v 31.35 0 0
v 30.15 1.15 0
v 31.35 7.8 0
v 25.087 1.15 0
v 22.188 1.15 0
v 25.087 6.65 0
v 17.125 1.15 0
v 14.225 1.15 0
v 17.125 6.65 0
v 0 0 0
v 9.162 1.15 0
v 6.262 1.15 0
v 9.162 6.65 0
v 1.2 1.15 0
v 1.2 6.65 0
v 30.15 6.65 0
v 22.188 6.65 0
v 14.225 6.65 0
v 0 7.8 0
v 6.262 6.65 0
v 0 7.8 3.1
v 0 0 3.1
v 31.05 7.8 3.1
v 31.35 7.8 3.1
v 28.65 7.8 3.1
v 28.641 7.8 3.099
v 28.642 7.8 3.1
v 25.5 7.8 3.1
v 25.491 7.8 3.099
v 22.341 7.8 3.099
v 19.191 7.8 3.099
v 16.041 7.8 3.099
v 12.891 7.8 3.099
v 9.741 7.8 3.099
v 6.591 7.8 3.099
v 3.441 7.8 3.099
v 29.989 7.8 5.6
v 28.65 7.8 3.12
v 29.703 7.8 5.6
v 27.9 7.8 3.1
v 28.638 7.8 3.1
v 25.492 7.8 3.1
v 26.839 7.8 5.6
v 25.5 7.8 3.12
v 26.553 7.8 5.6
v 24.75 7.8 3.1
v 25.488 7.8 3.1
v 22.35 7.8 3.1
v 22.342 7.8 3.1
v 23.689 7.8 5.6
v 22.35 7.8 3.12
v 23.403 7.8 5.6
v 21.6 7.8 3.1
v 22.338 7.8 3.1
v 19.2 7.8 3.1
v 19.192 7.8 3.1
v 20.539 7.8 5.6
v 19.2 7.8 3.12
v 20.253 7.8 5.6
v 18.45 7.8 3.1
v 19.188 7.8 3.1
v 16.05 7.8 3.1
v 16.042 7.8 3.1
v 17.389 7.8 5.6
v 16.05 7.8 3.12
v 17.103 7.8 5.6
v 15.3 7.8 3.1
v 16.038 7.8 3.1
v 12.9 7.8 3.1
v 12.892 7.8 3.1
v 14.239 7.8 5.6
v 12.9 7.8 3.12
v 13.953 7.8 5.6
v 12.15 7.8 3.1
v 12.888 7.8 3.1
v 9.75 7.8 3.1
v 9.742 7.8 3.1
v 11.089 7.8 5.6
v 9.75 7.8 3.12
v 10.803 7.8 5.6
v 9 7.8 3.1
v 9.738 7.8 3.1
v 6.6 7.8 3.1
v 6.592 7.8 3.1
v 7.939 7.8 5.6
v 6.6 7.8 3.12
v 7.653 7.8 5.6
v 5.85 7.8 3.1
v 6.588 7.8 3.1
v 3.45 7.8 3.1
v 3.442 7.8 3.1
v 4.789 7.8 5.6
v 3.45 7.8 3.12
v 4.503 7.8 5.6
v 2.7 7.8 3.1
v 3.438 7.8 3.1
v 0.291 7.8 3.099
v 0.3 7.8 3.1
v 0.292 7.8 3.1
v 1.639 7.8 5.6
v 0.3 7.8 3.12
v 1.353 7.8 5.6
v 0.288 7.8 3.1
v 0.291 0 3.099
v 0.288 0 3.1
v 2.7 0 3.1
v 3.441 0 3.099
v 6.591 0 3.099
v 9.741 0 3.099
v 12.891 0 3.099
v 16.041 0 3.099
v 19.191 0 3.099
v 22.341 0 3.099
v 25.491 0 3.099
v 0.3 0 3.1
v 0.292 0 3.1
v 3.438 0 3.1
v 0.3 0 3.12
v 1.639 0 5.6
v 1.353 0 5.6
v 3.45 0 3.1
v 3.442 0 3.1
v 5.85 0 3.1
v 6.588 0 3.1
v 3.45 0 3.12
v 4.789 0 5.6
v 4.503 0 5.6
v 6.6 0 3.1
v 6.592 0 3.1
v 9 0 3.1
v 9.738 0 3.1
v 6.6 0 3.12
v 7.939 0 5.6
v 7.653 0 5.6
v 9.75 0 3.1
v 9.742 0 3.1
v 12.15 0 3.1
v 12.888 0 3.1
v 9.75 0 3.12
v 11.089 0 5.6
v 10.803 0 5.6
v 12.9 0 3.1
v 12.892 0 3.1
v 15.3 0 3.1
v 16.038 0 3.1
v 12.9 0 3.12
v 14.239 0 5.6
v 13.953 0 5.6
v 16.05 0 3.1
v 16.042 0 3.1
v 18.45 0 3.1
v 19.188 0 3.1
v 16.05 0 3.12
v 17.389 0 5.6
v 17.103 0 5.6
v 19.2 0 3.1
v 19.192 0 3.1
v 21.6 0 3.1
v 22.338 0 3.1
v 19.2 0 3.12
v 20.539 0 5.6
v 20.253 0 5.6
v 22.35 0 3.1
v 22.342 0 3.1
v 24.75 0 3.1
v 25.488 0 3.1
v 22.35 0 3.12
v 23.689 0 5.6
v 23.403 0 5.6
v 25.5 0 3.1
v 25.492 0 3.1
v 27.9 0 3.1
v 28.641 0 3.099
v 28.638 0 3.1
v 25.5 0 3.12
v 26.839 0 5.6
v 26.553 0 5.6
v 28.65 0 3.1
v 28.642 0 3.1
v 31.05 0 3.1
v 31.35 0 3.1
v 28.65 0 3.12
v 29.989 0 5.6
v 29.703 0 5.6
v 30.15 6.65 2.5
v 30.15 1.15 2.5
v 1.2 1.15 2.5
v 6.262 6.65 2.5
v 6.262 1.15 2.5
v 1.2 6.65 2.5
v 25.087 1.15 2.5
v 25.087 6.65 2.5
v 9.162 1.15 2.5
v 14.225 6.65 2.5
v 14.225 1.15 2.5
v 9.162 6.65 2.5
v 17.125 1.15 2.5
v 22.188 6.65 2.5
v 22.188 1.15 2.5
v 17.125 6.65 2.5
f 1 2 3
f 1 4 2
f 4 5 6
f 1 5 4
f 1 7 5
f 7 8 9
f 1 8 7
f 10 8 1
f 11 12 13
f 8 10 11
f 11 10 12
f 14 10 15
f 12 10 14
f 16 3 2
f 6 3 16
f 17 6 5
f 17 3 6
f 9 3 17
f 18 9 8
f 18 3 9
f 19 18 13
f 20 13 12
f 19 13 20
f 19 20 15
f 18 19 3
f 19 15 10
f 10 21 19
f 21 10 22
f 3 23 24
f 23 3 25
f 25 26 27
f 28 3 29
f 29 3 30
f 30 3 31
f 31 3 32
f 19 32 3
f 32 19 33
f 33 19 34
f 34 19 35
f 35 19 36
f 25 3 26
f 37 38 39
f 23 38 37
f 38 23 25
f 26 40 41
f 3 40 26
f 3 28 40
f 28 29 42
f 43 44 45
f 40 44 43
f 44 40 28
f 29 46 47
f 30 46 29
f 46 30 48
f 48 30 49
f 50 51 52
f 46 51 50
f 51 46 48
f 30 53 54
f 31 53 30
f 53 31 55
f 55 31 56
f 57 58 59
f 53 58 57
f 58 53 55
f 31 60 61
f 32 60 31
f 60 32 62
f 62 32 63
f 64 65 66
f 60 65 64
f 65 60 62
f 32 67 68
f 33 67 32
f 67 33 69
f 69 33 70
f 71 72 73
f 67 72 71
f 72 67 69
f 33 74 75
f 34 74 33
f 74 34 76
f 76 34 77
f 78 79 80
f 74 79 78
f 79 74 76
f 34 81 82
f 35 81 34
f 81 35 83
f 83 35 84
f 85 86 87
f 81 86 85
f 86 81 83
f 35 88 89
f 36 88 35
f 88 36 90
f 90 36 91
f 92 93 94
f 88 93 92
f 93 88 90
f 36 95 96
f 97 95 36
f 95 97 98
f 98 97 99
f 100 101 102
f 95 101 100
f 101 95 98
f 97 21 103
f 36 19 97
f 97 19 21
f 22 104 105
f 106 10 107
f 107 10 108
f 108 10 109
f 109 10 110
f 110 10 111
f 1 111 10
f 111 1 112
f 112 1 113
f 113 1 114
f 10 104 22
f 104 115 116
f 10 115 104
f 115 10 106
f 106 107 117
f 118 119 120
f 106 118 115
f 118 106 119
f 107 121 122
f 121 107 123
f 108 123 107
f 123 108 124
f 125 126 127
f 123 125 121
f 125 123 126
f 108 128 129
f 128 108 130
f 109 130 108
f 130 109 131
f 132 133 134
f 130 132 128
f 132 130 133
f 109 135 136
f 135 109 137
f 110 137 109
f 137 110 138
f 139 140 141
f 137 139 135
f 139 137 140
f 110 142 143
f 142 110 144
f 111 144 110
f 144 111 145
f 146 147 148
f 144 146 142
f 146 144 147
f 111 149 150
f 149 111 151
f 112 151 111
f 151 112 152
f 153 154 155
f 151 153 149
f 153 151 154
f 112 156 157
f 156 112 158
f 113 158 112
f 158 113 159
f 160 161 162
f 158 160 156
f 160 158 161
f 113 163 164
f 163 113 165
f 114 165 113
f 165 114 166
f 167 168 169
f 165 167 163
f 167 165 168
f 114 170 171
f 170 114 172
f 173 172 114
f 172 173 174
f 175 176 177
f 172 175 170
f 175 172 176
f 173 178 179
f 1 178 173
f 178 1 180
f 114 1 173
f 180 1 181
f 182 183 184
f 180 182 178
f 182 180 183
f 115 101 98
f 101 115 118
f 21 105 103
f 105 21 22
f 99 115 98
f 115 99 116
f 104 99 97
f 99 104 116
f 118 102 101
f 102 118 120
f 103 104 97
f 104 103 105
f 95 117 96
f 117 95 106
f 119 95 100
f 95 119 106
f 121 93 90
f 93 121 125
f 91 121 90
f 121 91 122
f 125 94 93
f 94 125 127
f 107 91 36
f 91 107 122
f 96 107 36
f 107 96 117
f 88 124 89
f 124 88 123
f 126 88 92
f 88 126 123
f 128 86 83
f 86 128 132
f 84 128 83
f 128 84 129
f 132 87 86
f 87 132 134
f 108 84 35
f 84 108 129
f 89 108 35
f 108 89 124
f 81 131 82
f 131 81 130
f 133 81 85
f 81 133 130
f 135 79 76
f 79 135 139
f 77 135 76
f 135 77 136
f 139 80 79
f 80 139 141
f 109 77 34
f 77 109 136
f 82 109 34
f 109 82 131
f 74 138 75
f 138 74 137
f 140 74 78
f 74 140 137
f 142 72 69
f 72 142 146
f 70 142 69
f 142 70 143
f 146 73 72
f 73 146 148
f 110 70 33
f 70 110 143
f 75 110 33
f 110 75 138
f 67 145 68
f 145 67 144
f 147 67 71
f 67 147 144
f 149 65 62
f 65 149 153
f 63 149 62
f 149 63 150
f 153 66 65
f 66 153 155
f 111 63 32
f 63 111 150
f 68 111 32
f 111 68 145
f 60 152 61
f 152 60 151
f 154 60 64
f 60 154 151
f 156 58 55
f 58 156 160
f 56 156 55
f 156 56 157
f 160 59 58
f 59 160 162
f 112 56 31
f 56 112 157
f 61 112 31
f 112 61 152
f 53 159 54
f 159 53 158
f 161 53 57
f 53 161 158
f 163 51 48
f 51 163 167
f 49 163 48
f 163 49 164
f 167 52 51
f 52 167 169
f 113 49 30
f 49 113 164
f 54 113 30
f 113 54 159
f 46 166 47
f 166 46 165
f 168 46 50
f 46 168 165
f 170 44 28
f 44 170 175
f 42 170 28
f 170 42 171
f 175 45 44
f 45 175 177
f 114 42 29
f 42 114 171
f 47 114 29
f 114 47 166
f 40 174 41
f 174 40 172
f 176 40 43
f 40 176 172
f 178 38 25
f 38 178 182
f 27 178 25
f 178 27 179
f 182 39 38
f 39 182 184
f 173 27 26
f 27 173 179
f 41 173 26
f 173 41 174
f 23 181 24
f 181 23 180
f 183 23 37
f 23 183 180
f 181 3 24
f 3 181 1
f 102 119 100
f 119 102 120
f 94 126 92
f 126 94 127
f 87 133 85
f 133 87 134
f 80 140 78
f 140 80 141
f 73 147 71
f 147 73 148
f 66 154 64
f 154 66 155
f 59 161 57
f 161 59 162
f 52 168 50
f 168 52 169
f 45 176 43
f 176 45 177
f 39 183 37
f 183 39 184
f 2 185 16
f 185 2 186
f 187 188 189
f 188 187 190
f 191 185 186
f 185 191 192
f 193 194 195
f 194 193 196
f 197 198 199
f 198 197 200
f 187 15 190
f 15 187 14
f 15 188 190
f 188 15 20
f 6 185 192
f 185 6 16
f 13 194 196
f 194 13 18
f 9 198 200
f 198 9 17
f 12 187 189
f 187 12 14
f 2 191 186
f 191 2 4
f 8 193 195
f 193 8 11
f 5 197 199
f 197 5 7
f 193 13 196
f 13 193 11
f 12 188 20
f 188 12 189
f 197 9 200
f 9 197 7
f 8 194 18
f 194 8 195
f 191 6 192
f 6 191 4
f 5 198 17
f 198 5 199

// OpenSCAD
length = 31.35;
width= 7.8;
height= 5.8;

toothwidth = 3.15;

brick_width = 5.0625;
end_thickness = 1.2;
middle_thickness = 2.9;

module tooth()
{
	difference()
	{

		cube([3.21,width,height]);

		//1. Zahn
		translate([0,-0.1,4-0.9]) cube([0.3,width+0.2,1.8]);
		translate([-1.55,-0.1,3.88]) rotate([0,23,0]) cube([2,width+0.2,3]);

		//2. Zahn
		translate([2.2+0.5,-0.1,4-0.9]) cube([1/2+0.1,width+0.2,3]);
		translate([2.7,-0.1,3.1]) rotate([0,-23,0]) cube([1,width+0.2,3]);
		translate([2.2,-0.1,5.1]) cube([0.8,width+0.2,1.8]);
	}

}

		

module toothbrick4()
{

	difference()
	{

		union()
		{
			tooth();   				//1
			translate([toothwidth,0,0]) tooth();
			translate([2*toothwidth,0,0]) tooth();
			translate([3*toothwidth,0,0]) tooth();
			translate([4*toothwidth,0,0]) tooth();	//5
			translate([5*toothwidth,0,0]) tooth();
			translate([6*toothwidth,0,0]) tooth();
			translate([7*toothwidth,0,0]) tooth();
			translate([8*toothwidth,0,0]) tooth();	
			translate([9*toothwidth,0,0]) tooth();	//10
			
		}
	
	//cut end
	translate([length,0,0]) cube([10,10,10]);	
	
	//cut top
	translate([-0.5,-0.5,5.6]) cube([33,10,2]);

	//cut hole for bricks
	translate([end_thickness,1.15,-0.1]) cube([31.35-2*end_thickness,5.5,2.6]);
	
	}
}

//bridges between the bricks
translate([end_thickness+brick_width,0,0]) cube([middle_thickness,7.8,3]); 
translate([end_thickness+brick_width*2+middle_thickness,0,0]) cube([middle_thickness,7.8,3]); 
translate([end_thickness+brick_width*3+middle_thickness*2,0,0]) cube([middle_thickness,7.8,3]); 


toothbrick4();
